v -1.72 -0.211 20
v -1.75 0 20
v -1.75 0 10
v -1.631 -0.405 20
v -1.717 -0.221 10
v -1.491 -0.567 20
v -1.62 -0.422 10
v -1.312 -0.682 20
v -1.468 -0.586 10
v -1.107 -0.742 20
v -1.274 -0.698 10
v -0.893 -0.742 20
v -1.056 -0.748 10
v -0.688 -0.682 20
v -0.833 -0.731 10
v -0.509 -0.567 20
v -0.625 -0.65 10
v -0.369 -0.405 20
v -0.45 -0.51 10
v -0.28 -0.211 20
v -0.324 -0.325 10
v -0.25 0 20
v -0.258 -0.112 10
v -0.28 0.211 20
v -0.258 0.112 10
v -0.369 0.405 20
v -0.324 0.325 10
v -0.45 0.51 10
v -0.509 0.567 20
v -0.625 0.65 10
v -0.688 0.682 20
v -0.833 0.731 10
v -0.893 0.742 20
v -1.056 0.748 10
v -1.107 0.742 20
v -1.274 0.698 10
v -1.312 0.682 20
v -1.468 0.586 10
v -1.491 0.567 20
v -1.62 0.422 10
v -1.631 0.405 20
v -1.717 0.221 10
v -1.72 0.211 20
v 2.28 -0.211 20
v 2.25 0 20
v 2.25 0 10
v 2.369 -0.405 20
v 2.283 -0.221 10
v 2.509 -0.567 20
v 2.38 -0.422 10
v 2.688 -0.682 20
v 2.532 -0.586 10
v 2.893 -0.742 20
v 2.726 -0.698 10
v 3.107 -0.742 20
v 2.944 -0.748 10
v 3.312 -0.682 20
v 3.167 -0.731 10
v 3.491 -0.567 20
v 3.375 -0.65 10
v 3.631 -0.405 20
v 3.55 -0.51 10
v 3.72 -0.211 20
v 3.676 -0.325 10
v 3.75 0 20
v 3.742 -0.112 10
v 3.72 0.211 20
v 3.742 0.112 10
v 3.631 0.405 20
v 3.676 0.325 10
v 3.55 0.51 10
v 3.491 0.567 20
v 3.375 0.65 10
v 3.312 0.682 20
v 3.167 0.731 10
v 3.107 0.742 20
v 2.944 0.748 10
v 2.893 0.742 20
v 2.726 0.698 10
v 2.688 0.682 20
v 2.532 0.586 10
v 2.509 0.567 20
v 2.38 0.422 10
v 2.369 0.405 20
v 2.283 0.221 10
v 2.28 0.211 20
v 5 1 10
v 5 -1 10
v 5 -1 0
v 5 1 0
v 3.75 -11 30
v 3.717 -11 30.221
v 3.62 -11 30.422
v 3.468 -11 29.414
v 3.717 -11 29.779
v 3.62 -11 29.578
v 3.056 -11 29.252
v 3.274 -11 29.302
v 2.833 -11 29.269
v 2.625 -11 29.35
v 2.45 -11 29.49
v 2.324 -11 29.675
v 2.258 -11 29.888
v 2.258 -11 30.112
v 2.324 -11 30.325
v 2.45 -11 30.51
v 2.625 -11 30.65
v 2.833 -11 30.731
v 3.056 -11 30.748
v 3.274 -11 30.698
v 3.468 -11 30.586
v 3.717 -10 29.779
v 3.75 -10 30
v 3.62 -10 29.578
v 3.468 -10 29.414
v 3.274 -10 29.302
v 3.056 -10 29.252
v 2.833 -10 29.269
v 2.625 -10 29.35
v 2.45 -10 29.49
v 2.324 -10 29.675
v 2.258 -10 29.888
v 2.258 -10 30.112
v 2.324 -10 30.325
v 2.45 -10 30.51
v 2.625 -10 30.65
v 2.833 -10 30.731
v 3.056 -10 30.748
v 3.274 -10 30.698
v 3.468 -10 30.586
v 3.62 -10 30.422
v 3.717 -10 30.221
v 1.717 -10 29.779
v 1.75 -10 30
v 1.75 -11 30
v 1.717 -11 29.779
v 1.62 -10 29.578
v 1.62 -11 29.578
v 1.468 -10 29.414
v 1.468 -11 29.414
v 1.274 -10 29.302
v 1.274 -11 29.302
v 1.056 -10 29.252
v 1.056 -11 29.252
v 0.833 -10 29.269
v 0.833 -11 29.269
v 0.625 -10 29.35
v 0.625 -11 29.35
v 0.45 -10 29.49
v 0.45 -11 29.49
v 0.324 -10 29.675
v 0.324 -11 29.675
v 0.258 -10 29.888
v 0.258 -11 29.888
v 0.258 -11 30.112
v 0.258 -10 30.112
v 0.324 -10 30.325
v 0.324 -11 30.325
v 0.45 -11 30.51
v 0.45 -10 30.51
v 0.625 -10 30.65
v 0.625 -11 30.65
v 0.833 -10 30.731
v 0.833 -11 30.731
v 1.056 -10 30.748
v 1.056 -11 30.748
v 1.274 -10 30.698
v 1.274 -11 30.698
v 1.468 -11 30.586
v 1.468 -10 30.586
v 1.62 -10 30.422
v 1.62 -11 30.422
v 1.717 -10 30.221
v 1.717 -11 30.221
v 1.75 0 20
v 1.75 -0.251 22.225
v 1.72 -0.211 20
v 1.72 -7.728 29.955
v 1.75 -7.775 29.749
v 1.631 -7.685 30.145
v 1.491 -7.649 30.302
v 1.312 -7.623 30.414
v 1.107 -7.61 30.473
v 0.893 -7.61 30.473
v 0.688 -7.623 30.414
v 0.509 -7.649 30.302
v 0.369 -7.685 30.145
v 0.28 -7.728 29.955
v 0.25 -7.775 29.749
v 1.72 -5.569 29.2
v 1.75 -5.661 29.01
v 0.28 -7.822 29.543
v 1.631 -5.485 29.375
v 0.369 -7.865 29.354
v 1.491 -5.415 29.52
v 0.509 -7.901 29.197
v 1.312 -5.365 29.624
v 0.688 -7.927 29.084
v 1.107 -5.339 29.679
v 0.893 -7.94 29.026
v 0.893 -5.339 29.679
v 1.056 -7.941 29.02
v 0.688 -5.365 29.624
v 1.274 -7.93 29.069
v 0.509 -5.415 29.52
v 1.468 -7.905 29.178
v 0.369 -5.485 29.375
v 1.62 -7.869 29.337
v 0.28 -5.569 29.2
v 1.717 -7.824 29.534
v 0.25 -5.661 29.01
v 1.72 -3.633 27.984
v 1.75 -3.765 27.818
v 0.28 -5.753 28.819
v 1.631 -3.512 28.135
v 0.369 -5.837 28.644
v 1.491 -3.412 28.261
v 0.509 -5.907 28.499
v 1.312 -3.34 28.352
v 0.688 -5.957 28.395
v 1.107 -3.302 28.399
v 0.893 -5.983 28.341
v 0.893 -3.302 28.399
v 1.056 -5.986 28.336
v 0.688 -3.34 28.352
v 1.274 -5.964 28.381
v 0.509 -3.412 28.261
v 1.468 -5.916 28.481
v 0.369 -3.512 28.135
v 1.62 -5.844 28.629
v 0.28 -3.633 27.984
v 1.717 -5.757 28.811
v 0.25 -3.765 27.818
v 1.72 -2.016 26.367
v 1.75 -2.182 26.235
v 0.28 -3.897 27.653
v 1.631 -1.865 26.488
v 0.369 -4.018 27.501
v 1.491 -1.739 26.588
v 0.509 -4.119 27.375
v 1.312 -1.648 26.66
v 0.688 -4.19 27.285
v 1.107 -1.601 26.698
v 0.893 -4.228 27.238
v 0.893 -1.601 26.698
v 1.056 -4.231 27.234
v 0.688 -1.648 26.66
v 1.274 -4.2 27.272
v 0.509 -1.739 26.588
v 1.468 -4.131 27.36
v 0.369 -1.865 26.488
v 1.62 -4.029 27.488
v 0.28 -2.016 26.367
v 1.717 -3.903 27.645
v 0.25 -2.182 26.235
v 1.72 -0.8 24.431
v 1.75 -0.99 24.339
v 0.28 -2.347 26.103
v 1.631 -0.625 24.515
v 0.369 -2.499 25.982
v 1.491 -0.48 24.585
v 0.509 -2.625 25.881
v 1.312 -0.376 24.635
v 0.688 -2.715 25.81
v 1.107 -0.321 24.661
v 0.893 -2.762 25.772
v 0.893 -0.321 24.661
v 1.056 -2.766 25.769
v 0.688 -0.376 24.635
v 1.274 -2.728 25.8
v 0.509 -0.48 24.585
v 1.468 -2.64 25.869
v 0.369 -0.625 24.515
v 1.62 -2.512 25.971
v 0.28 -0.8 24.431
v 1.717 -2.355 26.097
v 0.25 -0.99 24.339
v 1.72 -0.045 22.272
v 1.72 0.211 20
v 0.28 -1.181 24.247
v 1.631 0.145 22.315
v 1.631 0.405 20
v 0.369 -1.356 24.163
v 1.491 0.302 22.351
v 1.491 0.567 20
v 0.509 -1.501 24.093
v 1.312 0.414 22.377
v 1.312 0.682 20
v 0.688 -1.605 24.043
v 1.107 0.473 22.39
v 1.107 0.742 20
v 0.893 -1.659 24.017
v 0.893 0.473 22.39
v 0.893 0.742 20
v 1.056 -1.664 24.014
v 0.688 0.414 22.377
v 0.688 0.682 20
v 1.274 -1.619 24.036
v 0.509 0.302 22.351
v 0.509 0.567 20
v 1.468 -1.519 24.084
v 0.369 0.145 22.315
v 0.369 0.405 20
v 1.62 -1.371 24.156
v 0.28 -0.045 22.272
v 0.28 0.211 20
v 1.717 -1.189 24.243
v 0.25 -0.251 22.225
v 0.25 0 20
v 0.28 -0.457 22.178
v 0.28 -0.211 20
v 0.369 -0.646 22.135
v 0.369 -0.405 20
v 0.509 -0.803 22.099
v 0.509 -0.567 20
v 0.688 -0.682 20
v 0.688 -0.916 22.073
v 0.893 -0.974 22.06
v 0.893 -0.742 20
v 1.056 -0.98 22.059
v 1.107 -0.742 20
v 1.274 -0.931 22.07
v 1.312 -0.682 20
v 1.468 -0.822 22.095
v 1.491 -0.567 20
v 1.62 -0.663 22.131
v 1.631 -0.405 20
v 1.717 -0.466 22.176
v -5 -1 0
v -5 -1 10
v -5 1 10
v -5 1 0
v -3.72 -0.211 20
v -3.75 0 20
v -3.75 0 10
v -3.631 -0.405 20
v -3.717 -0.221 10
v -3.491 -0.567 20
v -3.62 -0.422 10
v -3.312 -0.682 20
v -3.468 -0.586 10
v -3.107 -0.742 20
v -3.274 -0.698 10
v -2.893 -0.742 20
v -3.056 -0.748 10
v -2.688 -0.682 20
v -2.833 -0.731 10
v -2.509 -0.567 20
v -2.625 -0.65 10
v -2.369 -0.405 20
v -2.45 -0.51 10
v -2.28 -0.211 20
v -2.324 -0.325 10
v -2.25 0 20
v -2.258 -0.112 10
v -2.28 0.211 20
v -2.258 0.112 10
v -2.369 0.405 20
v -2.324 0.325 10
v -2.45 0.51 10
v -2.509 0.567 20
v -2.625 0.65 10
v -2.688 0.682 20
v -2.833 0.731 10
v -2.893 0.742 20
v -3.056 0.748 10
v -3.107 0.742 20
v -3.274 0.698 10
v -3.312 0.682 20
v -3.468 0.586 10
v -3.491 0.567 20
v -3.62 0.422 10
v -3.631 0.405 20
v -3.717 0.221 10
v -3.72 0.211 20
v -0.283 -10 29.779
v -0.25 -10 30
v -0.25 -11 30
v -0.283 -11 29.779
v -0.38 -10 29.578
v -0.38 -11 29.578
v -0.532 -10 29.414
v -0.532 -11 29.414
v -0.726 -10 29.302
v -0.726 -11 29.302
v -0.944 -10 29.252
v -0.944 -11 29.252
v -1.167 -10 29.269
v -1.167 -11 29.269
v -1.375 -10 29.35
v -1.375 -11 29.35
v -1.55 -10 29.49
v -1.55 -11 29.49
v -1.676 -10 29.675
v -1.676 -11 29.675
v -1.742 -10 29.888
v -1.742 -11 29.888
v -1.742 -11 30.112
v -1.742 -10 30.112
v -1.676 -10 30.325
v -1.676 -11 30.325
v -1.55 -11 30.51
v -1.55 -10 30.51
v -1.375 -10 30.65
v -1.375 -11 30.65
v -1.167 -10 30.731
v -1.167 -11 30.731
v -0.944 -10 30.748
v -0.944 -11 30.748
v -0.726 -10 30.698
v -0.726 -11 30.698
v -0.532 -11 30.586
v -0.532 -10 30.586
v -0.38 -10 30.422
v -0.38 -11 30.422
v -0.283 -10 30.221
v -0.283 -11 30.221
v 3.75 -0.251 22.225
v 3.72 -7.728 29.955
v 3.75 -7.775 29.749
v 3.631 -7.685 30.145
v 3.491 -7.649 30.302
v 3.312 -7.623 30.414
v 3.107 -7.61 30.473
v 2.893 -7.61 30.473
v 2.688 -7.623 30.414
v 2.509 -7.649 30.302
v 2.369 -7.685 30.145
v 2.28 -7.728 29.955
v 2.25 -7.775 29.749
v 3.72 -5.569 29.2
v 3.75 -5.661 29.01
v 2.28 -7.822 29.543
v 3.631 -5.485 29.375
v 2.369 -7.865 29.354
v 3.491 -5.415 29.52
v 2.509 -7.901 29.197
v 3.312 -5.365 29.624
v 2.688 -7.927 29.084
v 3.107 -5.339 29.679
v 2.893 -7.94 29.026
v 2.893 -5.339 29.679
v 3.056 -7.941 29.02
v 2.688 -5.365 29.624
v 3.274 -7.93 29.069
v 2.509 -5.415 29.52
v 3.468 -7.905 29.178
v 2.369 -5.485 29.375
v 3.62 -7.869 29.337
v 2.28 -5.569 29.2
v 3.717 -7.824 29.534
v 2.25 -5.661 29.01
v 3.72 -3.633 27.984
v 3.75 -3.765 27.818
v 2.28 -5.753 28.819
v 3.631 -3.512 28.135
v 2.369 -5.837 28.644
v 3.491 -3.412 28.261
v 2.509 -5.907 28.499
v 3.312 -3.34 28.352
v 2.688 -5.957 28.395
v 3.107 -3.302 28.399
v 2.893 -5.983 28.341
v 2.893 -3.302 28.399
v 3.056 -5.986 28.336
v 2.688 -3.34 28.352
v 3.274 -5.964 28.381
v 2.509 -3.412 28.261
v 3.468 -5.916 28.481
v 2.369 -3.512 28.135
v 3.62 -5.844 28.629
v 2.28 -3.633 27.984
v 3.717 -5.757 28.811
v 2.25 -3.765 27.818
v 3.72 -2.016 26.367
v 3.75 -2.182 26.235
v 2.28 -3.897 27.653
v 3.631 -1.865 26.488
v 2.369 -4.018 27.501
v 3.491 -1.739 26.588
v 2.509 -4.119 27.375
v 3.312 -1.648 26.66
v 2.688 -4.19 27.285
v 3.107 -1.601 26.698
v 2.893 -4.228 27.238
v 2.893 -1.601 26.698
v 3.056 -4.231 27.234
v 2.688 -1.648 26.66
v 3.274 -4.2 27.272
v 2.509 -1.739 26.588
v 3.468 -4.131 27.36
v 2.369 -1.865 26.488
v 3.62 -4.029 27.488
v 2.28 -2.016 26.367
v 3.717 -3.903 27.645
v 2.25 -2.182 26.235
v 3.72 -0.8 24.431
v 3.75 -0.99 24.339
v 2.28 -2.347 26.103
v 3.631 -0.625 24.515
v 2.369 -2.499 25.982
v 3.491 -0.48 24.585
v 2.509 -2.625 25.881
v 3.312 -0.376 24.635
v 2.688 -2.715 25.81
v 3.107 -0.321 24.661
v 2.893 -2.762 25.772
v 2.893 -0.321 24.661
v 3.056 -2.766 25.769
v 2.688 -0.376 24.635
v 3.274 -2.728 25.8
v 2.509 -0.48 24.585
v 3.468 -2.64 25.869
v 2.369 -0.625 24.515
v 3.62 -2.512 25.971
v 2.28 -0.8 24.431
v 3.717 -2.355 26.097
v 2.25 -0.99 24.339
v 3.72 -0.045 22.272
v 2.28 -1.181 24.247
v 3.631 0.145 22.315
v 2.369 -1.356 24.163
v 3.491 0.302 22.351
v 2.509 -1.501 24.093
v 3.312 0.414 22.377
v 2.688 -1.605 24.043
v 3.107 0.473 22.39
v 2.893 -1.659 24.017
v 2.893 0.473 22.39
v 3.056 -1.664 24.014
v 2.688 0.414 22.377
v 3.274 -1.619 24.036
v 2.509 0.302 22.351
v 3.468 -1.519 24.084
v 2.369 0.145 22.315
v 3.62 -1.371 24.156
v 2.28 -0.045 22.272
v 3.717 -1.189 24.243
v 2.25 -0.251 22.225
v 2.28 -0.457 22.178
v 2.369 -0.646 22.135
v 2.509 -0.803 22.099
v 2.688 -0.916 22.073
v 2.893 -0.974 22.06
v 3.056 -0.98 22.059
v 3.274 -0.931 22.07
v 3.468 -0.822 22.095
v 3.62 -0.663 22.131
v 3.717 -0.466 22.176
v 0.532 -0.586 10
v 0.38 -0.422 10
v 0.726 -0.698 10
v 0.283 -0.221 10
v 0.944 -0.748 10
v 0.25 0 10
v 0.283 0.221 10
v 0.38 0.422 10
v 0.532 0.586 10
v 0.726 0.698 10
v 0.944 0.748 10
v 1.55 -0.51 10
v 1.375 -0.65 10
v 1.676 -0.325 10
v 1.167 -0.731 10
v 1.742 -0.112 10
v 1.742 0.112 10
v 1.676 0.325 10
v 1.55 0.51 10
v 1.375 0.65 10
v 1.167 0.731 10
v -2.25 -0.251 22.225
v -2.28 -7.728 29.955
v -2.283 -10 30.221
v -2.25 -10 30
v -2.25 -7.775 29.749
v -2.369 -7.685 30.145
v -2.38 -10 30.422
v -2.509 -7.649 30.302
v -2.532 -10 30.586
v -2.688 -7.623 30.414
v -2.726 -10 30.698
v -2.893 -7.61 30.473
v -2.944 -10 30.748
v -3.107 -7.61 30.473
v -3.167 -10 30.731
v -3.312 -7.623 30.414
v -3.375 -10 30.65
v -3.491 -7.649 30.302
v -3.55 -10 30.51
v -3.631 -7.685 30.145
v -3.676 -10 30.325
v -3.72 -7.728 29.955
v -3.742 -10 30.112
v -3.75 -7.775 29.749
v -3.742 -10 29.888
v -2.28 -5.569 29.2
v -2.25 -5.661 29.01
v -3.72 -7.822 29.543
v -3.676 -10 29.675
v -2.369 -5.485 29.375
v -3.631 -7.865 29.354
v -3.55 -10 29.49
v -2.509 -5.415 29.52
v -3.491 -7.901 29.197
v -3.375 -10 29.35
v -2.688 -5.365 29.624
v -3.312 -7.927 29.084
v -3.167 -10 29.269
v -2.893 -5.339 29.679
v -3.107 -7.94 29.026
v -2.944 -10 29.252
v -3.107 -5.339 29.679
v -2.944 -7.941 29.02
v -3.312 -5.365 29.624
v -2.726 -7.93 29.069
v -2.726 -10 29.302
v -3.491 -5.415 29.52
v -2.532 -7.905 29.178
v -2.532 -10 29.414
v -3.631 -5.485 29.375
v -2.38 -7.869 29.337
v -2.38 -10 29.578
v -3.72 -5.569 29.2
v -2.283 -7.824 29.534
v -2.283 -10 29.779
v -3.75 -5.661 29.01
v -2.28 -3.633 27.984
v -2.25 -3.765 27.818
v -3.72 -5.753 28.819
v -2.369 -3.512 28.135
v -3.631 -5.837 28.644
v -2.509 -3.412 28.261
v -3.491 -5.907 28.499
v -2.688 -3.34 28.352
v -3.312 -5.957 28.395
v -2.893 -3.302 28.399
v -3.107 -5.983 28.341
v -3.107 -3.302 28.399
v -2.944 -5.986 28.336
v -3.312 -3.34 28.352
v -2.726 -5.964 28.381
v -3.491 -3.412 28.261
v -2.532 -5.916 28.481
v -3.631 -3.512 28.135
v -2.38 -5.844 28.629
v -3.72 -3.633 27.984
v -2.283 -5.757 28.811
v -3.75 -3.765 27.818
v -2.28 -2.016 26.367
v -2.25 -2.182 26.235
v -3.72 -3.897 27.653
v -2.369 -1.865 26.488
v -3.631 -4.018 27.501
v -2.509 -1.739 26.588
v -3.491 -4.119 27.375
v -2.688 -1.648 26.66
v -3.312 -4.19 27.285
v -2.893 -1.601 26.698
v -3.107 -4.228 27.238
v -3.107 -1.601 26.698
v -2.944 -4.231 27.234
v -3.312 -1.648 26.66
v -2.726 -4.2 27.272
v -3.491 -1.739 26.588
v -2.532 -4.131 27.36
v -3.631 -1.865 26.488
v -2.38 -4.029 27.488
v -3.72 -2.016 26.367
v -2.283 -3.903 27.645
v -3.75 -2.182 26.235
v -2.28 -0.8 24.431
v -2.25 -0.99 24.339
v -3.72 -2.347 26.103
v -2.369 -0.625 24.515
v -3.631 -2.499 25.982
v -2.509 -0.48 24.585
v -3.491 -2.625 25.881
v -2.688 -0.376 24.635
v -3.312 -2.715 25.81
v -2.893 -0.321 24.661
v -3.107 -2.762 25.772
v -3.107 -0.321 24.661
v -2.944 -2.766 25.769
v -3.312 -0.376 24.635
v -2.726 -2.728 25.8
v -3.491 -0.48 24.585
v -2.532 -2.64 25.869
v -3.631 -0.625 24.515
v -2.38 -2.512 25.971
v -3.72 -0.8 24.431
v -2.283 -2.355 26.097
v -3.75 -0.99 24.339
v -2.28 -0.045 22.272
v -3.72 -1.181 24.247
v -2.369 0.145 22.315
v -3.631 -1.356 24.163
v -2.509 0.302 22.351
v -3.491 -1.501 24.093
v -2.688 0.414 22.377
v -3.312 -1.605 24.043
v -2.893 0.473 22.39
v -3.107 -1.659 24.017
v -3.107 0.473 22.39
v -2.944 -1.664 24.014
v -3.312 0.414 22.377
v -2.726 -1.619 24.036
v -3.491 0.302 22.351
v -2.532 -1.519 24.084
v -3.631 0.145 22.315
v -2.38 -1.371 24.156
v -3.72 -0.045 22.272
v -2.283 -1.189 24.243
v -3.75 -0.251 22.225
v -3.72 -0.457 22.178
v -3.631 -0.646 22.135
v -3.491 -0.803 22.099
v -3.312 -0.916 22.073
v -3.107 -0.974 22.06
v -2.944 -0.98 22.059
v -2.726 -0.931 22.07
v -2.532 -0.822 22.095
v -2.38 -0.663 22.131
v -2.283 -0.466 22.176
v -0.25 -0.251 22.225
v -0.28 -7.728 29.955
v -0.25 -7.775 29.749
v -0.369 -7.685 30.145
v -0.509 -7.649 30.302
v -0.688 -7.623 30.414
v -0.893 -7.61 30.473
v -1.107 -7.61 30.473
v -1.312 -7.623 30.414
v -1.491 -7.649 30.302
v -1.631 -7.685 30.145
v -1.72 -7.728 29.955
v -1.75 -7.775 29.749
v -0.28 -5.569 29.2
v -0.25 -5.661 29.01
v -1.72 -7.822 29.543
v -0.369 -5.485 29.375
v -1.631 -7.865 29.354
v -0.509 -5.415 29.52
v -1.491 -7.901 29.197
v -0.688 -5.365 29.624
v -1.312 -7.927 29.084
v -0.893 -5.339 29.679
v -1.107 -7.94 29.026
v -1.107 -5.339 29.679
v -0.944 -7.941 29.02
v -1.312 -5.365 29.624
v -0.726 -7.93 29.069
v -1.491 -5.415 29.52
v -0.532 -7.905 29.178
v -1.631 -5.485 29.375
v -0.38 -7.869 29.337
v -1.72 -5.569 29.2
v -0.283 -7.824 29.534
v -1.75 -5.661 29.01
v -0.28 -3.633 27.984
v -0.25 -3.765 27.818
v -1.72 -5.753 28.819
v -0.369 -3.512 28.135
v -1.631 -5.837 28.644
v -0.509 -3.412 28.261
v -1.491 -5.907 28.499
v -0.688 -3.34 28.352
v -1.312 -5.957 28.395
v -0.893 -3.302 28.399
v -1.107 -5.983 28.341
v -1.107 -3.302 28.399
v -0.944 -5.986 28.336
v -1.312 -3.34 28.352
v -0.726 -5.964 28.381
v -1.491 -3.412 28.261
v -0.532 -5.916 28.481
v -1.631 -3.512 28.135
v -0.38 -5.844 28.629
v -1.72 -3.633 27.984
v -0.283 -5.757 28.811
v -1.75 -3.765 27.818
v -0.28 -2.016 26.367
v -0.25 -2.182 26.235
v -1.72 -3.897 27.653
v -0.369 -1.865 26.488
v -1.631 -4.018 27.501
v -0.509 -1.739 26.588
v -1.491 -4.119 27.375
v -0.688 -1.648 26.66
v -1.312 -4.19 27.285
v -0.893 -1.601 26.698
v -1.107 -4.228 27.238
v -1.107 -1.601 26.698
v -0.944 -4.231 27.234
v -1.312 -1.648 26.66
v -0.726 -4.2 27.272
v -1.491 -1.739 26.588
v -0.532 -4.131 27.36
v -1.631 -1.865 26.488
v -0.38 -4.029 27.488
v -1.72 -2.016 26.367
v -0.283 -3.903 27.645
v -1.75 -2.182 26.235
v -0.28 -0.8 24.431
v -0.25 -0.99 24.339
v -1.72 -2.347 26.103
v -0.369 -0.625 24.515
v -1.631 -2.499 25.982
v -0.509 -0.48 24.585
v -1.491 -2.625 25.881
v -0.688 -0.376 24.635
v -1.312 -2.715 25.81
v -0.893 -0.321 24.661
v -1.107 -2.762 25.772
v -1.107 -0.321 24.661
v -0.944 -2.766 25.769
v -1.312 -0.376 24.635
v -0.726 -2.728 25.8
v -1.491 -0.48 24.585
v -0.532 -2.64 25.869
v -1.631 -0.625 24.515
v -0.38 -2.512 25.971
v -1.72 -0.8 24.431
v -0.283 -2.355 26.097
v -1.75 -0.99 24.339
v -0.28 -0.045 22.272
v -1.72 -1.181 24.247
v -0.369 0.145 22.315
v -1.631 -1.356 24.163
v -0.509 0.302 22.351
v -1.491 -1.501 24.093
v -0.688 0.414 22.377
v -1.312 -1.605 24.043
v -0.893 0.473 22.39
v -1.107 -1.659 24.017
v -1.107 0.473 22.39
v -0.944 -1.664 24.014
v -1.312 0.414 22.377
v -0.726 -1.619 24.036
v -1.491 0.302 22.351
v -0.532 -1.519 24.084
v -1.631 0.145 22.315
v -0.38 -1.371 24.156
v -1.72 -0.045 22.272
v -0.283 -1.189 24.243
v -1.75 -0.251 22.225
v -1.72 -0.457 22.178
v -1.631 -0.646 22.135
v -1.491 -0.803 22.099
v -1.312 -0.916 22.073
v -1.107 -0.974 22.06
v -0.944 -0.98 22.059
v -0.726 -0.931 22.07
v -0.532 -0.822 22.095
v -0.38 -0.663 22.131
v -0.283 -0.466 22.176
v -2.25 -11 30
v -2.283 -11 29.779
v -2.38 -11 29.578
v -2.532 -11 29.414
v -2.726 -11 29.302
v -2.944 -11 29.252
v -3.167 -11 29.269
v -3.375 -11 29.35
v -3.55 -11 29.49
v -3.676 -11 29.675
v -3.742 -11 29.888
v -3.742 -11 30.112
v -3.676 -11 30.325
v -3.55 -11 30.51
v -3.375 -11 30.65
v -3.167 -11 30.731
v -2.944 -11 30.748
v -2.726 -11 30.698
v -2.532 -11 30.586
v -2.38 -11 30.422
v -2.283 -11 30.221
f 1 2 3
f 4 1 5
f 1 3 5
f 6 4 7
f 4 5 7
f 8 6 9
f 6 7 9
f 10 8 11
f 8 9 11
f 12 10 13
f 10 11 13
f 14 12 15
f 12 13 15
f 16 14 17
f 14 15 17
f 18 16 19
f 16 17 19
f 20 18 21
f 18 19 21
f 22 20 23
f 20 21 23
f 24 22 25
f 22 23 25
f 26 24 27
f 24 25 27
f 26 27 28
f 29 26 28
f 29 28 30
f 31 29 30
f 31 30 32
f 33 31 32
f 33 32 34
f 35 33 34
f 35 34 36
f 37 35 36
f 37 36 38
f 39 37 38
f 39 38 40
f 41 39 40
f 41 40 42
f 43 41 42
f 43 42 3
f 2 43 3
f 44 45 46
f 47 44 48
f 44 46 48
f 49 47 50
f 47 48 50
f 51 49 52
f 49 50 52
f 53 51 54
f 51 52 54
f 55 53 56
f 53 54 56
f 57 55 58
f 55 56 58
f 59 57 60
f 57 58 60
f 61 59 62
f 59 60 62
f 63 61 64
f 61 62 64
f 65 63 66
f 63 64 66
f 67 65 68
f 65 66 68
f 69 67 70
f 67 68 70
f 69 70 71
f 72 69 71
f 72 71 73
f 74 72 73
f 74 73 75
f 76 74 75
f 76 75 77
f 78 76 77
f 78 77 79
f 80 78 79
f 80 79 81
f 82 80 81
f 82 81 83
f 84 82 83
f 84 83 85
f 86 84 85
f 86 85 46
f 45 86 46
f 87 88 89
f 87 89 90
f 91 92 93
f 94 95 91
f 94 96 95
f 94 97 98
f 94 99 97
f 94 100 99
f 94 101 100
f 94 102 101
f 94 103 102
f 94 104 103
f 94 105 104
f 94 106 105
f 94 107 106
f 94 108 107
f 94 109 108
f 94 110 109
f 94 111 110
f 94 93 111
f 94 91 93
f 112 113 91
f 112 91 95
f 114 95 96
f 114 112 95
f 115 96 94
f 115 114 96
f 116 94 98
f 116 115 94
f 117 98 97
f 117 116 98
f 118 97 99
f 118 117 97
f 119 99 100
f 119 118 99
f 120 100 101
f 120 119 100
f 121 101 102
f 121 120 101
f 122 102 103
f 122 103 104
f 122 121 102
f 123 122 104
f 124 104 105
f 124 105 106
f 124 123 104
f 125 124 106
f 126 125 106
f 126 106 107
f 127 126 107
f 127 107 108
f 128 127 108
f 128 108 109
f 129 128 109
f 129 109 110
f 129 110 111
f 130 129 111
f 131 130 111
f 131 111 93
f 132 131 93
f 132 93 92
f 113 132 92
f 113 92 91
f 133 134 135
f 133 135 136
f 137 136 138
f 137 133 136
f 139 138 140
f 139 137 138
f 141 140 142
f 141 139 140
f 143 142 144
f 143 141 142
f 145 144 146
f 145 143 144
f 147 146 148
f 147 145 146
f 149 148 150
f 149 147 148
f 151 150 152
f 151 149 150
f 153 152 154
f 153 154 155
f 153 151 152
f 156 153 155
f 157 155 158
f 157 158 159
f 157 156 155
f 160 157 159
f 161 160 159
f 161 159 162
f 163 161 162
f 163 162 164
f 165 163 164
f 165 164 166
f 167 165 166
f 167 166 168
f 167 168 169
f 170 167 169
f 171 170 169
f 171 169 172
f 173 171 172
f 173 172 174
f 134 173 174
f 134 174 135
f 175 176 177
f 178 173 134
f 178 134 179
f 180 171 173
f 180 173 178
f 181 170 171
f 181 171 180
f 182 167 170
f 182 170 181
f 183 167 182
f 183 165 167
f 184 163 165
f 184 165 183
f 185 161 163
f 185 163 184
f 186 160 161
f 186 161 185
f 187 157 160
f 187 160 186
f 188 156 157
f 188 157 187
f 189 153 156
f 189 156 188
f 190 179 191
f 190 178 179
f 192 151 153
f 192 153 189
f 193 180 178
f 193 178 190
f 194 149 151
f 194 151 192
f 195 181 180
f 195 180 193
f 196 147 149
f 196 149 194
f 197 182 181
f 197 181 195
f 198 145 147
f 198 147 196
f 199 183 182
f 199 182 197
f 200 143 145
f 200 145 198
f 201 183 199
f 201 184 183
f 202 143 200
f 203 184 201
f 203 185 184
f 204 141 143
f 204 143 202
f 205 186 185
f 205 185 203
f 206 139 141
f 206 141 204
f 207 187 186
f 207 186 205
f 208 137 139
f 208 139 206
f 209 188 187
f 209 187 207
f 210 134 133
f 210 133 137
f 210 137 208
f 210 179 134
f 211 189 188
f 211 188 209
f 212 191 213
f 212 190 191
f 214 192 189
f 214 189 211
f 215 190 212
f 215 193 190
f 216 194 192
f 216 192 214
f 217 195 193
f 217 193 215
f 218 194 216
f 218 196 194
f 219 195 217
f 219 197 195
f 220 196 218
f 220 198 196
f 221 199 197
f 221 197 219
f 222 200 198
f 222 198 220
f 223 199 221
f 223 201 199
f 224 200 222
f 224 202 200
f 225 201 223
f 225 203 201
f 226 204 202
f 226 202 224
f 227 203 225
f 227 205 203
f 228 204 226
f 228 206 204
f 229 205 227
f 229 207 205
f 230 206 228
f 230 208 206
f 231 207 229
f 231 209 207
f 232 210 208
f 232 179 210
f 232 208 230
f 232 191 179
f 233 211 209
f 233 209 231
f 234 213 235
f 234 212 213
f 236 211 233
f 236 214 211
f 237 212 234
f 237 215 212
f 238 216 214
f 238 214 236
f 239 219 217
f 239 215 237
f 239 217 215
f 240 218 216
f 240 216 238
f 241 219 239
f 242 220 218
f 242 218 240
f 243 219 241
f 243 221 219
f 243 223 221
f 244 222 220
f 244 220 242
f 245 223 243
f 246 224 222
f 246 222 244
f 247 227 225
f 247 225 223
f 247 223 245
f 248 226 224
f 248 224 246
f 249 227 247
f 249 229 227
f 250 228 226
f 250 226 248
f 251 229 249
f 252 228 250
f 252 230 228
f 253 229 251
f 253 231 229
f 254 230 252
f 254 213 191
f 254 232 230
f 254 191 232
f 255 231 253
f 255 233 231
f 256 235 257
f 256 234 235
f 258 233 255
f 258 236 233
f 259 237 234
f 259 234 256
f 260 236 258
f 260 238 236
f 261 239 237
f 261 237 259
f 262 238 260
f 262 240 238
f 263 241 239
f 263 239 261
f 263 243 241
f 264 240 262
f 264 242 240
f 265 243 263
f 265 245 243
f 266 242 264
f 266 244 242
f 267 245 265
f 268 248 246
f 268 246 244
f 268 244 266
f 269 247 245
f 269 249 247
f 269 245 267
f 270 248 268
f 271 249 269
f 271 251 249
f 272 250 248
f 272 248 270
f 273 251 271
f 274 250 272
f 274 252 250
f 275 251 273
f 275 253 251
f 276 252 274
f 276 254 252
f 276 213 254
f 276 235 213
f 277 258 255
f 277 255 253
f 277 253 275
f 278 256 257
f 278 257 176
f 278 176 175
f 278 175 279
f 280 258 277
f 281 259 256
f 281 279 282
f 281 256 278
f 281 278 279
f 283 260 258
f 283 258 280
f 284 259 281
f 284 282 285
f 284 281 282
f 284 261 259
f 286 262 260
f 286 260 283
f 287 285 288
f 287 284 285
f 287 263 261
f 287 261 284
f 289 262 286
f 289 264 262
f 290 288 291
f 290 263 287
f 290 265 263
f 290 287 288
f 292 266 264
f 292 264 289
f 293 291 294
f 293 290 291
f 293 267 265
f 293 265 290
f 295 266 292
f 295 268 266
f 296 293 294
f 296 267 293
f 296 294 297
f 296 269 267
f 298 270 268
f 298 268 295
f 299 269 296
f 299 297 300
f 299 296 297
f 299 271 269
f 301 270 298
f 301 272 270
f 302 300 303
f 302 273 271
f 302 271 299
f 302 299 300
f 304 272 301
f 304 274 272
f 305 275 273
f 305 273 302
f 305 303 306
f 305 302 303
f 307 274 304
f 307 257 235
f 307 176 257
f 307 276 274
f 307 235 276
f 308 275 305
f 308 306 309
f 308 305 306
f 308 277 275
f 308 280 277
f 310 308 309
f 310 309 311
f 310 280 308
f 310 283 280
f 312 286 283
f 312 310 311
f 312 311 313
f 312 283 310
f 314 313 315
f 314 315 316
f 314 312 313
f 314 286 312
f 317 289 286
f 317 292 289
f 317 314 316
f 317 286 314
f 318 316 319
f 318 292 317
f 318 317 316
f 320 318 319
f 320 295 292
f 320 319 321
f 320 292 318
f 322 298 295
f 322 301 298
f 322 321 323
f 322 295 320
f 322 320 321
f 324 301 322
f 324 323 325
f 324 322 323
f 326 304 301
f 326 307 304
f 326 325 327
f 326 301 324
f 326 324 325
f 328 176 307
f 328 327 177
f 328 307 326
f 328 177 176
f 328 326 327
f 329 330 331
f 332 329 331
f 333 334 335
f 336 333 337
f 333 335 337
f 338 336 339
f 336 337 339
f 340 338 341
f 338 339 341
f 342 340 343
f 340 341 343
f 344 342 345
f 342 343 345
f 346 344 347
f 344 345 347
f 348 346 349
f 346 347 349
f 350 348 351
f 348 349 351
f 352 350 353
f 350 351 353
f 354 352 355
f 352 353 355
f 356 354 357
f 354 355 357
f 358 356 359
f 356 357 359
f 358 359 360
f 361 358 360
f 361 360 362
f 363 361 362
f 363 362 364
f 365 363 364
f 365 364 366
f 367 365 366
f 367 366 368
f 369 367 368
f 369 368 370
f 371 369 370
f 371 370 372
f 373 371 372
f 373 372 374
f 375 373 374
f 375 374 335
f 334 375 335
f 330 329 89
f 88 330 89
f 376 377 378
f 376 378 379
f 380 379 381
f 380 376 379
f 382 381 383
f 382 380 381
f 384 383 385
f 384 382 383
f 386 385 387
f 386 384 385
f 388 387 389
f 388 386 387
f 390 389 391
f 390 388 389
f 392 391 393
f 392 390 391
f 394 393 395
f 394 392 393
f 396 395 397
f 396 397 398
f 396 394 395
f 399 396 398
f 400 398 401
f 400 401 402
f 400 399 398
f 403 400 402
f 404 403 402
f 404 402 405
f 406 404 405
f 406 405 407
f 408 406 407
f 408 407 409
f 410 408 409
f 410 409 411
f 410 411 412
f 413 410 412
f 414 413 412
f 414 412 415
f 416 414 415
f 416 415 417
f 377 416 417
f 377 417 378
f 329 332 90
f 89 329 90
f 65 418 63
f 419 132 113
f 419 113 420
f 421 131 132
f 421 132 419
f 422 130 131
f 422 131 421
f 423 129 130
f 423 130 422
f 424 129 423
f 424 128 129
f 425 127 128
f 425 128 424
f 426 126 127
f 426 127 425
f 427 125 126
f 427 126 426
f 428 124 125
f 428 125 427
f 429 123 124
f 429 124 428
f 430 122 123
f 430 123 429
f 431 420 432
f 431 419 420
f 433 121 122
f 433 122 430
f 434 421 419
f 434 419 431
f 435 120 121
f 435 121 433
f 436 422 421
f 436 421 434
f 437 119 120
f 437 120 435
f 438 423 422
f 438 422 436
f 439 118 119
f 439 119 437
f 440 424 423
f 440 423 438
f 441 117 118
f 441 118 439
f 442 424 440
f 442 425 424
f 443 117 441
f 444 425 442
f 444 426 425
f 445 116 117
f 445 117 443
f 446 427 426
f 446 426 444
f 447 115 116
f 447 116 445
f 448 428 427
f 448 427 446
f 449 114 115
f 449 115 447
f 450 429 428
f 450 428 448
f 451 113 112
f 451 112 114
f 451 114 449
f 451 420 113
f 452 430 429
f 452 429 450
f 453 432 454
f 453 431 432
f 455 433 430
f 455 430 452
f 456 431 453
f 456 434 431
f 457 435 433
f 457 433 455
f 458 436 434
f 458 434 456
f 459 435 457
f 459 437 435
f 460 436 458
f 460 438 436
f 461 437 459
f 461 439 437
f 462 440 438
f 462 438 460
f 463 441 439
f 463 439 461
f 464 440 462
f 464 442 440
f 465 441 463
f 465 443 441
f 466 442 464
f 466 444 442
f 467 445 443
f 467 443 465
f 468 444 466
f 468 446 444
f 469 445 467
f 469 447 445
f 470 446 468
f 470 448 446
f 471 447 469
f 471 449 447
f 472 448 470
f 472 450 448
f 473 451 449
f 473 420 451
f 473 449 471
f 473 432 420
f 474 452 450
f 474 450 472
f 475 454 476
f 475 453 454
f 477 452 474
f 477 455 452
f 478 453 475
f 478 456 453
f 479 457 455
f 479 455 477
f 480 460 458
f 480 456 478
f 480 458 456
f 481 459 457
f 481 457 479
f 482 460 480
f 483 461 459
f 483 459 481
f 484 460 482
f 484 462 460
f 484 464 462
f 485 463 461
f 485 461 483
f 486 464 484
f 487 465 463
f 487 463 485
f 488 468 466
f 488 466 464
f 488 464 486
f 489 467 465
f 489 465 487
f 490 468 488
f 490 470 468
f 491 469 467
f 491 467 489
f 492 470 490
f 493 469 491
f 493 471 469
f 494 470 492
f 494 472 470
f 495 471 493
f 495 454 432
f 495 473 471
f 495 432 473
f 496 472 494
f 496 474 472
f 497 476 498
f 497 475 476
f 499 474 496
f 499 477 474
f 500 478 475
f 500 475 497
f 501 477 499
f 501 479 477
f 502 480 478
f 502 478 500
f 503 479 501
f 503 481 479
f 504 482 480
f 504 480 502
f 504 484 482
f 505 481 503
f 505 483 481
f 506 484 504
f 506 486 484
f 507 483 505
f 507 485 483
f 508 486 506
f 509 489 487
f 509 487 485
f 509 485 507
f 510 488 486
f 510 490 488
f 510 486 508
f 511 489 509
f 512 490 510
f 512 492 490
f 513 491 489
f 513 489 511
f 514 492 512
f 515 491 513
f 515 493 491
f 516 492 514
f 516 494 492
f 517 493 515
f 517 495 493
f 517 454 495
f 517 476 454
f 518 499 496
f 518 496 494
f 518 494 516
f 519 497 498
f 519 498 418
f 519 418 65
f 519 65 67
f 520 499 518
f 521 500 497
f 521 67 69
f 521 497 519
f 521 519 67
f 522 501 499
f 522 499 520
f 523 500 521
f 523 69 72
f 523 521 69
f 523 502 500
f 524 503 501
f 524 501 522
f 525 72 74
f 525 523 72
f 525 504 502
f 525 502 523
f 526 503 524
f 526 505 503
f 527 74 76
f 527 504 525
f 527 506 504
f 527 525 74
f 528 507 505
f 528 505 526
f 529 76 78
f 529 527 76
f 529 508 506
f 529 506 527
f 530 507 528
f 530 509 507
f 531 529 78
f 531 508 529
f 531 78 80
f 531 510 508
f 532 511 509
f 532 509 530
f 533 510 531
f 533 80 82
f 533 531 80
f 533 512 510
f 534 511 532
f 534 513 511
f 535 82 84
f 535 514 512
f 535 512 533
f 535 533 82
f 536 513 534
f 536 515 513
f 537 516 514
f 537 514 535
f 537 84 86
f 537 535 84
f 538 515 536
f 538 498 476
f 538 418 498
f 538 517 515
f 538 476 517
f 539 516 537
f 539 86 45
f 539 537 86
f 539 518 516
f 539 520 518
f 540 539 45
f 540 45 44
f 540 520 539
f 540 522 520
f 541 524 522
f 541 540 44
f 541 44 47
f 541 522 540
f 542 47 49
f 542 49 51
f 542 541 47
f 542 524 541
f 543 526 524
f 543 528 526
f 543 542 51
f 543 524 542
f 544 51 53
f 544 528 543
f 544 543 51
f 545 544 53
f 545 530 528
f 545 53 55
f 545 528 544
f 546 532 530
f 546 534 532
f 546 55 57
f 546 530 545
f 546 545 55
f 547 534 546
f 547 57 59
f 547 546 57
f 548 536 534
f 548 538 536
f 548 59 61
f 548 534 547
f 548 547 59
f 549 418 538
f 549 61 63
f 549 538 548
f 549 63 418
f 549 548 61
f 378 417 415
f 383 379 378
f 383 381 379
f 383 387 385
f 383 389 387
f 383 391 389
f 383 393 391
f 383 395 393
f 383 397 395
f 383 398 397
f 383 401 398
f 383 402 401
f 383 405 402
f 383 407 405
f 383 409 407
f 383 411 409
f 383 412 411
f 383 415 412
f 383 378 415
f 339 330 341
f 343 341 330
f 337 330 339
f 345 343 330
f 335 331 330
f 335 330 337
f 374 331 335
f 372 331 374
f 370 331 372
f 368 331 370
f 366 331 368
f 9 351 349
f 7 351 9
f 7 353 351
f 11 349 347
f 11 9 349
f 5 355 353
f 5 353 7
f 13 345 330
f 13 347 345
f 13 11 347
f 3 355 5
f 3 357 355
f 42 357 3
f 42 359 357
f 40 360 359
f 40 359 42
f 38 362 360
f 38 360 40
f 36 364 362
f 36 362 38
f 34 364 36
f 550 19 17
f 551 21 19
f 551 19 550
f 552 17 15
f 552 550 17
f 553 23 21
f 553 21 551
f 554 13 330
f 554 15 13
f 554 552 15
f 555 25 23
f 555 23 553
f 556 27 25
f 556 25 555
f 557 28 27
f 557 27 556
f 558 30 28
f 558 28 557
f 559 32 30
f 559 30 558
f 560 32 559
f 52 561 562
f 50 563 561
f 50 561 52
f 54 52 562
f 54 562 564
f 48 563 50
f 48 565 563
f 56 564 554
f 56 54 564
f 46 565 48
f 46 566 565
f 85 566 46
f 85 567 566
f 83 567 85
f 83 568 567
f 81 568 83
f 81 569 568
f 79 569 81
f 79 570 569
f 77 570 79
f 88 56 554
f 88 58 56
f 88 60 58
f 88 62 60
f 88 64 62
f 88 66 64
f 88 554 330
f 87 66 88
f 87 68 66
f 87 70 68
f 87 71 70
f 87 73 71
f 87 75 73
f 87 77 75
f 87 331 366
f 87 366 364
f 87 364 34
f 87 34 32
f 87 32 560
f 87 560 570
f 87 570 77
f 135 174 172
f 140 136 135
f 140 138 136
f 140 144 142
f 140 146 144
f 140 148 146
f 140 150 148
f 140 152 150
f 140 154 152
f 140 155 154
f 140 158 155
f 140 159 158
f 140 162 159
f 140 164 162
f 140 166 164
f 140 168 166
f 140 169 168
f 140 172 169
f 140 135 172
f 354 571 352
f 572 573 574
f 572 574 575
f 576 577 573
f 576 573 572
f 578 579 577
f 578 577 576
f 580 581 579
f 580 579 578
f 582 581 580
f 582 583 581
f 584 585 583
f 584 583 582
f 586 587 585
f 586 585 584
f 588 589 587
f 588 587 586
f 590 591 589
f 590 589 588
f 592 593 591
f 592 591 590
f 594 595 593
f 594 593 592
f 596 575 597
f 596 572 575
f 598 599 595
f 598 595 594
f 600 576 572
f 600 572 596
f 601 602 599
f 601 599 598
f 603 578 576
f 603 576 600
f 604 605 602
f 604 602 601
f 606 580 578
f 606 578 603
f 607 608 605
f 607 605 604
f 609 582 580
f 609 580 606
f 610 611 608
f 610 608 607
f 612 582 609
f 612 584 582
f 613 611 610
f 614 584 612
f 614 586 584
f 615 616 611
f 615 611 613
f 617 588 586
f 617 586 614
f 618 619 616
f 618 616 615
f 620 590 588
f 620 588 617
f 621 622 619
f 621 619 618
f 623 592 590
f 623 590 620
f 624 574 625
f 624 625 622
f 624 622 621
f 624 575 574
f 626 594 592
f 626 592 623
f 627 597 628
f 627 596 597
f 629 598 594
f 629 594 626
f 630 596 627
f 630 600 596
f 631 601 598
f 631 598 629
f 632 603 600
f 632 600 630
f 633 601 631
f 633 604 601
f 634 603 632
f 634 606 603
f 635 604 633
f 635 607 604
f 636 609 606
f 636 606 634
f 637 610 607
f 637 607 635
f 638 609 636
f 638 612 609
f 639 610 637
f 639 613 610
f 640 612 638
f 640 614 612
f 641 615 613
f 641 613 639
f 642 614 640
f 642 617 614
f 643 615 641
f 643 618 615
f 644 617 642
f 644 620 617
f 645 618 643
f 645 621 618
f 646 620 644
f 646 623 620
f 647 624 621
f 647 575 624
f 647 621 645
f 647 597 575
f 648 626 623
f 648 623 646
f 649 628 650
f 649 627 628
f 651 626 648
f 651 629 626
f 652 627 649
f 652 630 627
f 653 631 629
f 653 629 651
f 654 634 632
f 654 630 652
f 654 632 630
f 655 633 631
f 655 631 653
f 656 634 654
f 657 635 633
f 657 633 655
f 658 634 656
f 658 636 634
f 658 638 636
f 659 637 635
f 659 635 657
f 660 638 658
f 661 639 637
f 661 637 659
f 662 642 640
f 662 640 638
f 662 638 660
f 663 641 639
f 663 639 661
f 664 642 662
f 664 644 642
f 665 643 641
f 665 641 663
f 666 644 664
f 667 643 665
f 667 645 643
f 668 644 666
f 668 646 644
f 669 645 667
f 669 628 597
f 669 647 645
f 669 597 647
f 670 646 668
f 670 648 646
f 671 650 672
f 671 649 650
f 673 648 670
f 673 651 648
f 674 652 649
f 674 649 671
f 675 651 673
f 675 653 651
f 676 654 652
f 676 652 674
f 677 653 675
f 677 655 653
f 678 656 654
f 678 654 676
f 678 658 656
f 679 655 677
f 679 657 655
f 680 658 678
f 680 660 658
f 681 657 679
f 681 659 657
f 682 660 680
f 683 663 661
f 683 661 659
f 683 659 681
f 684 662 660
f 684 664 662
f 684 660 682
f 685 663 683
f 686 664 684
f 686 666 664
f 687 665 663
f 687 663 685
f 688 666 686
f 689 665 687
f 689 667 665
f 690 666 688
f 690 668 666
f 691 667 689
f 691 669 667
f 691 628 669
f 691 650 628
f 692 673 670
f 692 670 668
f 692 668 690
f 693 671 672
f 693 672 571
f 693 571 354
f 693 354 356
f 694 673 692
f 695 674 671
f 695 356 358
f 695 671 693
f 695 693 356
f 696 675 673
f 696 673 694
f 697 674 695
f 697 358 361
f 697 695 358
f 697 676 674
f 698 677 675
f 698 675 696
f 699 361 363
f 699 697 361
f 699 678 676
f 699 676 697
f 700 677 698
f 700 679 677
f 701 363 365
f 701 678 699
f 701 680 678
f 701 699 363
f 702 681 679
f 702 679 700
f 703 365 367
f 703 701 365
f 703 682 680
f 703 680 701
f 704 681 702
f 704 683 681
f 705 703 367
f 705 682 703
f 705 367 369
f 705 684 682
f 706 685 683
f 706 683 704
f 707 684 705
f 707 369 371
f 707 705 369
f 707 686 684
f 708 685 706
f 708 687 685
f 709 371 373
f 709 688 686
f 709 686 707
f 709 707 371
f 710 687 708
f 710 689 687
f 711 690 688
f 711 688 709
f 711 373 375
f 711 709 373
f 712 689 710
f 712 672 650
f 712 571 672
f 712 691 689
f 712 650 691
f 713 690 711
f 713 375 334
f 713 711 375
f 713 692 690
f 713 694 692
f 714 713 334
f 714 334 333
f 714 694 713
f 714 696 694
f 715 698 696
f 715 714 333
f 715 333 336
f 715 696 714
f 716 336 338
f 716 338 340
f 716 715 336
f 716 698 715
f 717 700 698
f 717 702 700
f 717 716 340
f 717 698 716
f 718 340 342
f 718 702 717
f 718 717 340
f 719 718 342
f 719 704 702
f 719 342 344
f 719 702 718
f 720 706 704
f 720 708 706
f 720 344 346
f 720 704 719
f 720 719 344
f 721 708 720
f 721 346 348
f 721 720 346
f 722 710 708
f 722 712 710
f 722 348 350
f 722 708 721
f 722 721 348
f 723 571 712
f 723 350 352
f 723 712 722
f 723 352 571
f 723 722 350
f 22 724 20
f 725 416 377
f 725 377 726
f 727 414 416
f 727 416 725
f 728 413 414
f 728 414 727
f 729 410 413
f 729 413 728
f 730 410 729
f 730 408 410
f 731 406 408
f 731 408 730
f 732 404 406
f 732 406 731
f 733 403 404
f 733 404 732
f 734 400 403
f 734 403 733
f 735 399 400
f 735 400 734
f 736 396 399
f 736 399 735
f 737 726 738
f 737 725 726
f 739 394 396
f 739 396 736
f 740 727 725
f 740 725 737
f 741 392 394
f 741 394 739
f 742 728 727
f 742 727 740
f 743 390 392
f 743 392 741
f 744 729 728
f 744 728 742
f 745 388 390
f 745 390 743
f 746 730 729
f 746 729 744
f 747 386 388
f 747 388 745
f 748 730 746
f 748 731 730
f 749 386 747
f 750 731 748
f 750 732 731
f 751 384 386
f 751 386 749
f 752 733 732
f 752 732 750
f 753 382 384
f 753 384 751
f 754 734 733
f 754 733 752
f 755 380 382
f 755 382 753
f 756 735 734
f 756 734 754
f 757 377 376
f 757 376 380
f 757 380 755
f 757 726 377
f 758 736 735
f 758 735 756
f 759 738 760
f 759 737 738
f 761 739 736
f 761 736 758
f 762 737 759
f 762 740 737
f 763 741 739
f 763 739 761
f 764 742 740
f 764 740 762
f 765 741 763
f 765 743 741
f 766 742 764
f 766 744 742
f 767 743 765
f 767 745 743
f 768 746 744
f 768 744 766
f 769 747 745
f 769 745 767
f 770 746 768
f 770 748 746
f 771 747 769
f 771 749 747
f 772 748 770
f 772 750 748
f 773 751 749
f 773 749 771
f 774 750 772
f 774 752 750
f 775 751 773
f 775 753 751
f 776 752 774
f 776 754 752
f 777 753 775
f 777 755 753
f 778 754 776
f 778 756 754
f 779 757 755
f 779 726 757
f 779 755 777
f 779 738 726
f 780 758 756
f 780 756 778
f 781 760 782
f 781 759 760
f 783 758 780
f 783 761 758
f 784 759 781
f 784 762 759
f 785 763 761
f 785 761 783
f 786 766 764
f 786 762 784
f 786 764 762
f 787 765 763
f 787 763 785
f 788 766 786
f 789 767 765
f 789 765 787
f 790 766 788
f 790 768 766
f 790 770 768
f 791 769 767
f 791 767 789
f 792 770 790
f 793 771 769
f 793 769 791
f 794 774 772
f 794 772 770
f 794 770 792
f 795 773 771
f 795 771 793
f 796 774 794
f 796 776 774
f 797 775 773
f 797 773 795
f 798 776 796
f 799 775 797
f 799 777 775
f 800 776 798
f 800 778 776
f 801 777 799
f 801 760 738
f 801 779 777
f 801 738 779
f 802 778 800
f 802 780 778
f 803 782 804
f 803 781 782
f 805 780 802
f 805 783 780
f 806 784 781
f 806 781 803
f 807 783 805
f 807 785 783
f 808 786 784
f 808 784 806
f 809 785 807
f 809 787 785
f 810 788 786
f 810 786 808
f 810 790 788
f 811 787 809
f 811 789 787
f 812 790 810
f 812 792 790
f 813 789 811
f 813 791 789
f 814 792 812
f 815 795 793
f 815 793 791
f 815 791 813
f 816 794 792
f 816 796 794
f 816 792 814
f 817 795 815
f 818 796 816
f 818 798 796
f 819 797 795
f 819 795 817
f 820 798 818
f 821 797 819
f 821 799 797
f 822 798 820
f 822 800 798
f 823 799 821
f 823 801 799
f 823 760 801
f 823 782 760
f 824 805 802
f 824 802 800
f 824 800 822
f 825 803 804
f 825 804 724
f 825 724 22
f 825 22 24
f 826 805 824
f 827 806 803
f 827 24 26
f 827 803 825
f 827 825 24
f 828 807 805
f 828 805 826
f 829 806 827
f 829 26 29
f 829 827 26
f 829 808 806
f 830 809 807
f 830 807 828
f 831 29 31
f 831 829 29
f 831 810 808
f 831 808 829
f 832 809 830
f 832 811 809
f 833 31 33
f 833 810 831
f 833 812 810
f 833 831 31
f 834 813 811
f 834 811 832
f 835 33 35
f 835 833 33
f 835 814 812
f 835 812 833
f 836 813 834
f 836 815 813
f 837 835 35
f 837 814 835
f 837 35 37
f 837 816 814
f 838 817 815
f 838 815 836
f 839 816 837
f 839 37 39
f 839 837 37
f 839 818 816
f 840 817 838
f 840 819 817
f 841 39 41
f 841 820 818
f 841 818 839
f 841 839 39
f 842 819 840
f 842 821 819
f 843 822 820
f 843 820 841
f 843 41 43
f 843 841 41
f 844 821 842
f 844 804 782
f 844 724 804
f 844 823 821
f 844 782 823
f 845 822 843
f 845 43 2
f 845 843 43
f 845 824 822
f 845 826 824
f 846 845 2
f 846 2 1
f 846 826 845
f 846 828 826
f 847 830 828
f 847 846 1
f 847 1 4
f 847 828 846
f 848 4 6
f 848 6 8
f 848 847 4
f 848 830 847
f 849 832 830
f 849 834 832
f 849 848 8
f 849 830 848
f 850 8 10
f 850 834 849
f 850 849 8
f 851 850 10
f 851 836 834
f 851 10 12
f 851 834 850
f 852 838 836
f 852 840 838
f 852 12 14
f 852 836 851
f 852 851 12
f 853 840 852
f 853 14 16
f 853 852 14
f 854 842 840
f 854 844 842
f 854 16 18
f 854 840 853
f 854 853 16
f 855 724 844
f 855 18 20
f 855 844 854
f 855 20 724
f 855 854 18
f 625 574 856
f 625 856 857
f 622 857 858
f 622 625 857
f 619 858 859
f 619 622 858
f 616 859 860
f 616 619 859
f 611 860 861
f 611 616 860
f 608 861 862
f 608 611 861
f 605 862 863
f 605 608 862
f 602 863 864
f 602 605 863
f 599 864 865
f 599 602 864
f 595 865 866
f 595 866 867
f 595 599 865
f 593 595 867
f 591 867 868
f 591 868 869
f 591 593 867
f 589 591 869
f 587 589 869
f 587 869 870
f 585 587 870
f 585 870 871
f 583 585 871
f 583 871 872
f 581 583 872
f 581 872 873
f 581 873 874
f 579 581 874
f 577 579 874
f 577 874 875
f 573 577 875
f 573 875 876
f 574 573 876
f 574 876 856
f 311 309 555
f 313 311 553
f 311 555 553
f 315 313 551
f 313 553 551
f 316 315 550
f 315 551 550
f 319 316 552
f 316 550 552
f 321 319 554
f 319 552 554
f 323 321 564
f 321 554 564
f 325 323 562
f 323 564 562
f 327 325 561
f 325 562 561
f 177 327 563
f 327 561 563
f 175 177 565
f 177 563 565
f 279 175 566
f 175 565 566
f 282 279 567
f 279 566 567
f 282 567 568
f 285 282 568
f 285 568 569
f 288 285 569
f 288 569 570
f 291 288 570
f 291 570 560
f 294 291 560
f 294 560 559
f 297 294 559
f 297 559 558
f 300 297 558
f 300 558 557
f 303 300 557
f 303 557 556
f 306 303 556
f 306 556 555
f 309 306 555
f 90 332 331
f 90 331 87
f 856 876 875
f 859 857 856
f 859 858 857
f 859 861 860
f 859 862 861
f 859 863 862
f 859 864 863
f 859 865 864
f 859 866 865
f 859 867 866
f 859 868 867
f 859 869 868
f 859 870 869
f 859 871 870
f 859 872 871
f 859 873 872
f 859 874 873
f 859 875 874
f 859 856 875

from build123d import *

# Parameters (mm, degrees)
SKIZZE1_W                       = 10
SKIZZE1_H                       = 2
AUFSATZ_LINEAR_AUSTRAGEN1_DEPTH = 10
SKIZZE2_R                       = 0.75
AUFSATZ_LINEAR_AUSTRAGEN2_DEPTH = 10
SKIZZE4_R                       = 0.75
LINEARES_MUSTER1_COUNT          = 4
LINEARES_MUSTER1_PITCH          = 2


with BuildPart() as part:
    # Skizze1 → Aufsatz-Linear austragen1 (new body)
    with BuildSketch(Plane.XY):
        Rectangle(SKIZZE1_W, SKIZZE1_H)
    extrude(amount=AUFSATZ_LINEAR_AUSTRAGEN1_DEPTH)

    # Skizze2 → Aufsatz-Linear austragen2 (add)
    with BuildSketch(Plane.XY.offset(10)):
        with Locations(Location((-1, 0, 0), (0, 0, 180))):
            Circle(SKIZZE2_R)
        with Locations(Location((-3, 0, 0), (0, 0, 180))):
            Circle(SKIZZE2_R)
        with Locations(Location((1, 0, 0), (0, 0, 180))):
            Circle(SKIZZE2_R)
        with Locations(Location((3, 0, 0), (0, 0, 180))):
            Circle(SKIZZE2_R)
    extrude(amount=AUFSATZ_LINEAR_AUSTRAGEN2_DEPTH)

    # Austragung1: sweep along a path in Skizze3
    with BuildLine(Plane(origin=(-3, 0, 0), x_dir=(0, 0, -1), z_dir=(1, 0, 0))) as austragung1_path:
        Line((-30, -11), (-30, -10))
        ThreePointArc((-30, -10), (-27.071067812, -2.928932188), (-20, 0))
    # Skizze4 → Austragung1 (sweep)
    with BuildSketch(Plane.XY.offset(20)):
        with Locations((-3, 0)):
            Circle(SKIZZE4_R)
    austragung1 = sweep(path=austragung1_path.line)

    # Lineares Muster1: Austragung1 ×4
    with Locations(*[(i * LINEARES_MUSTER1_PITCH, 0, 0) for i in range(1, LINEARES_MUSTER1_COUNT)]):
        add(austragung1)


solid = part.part
